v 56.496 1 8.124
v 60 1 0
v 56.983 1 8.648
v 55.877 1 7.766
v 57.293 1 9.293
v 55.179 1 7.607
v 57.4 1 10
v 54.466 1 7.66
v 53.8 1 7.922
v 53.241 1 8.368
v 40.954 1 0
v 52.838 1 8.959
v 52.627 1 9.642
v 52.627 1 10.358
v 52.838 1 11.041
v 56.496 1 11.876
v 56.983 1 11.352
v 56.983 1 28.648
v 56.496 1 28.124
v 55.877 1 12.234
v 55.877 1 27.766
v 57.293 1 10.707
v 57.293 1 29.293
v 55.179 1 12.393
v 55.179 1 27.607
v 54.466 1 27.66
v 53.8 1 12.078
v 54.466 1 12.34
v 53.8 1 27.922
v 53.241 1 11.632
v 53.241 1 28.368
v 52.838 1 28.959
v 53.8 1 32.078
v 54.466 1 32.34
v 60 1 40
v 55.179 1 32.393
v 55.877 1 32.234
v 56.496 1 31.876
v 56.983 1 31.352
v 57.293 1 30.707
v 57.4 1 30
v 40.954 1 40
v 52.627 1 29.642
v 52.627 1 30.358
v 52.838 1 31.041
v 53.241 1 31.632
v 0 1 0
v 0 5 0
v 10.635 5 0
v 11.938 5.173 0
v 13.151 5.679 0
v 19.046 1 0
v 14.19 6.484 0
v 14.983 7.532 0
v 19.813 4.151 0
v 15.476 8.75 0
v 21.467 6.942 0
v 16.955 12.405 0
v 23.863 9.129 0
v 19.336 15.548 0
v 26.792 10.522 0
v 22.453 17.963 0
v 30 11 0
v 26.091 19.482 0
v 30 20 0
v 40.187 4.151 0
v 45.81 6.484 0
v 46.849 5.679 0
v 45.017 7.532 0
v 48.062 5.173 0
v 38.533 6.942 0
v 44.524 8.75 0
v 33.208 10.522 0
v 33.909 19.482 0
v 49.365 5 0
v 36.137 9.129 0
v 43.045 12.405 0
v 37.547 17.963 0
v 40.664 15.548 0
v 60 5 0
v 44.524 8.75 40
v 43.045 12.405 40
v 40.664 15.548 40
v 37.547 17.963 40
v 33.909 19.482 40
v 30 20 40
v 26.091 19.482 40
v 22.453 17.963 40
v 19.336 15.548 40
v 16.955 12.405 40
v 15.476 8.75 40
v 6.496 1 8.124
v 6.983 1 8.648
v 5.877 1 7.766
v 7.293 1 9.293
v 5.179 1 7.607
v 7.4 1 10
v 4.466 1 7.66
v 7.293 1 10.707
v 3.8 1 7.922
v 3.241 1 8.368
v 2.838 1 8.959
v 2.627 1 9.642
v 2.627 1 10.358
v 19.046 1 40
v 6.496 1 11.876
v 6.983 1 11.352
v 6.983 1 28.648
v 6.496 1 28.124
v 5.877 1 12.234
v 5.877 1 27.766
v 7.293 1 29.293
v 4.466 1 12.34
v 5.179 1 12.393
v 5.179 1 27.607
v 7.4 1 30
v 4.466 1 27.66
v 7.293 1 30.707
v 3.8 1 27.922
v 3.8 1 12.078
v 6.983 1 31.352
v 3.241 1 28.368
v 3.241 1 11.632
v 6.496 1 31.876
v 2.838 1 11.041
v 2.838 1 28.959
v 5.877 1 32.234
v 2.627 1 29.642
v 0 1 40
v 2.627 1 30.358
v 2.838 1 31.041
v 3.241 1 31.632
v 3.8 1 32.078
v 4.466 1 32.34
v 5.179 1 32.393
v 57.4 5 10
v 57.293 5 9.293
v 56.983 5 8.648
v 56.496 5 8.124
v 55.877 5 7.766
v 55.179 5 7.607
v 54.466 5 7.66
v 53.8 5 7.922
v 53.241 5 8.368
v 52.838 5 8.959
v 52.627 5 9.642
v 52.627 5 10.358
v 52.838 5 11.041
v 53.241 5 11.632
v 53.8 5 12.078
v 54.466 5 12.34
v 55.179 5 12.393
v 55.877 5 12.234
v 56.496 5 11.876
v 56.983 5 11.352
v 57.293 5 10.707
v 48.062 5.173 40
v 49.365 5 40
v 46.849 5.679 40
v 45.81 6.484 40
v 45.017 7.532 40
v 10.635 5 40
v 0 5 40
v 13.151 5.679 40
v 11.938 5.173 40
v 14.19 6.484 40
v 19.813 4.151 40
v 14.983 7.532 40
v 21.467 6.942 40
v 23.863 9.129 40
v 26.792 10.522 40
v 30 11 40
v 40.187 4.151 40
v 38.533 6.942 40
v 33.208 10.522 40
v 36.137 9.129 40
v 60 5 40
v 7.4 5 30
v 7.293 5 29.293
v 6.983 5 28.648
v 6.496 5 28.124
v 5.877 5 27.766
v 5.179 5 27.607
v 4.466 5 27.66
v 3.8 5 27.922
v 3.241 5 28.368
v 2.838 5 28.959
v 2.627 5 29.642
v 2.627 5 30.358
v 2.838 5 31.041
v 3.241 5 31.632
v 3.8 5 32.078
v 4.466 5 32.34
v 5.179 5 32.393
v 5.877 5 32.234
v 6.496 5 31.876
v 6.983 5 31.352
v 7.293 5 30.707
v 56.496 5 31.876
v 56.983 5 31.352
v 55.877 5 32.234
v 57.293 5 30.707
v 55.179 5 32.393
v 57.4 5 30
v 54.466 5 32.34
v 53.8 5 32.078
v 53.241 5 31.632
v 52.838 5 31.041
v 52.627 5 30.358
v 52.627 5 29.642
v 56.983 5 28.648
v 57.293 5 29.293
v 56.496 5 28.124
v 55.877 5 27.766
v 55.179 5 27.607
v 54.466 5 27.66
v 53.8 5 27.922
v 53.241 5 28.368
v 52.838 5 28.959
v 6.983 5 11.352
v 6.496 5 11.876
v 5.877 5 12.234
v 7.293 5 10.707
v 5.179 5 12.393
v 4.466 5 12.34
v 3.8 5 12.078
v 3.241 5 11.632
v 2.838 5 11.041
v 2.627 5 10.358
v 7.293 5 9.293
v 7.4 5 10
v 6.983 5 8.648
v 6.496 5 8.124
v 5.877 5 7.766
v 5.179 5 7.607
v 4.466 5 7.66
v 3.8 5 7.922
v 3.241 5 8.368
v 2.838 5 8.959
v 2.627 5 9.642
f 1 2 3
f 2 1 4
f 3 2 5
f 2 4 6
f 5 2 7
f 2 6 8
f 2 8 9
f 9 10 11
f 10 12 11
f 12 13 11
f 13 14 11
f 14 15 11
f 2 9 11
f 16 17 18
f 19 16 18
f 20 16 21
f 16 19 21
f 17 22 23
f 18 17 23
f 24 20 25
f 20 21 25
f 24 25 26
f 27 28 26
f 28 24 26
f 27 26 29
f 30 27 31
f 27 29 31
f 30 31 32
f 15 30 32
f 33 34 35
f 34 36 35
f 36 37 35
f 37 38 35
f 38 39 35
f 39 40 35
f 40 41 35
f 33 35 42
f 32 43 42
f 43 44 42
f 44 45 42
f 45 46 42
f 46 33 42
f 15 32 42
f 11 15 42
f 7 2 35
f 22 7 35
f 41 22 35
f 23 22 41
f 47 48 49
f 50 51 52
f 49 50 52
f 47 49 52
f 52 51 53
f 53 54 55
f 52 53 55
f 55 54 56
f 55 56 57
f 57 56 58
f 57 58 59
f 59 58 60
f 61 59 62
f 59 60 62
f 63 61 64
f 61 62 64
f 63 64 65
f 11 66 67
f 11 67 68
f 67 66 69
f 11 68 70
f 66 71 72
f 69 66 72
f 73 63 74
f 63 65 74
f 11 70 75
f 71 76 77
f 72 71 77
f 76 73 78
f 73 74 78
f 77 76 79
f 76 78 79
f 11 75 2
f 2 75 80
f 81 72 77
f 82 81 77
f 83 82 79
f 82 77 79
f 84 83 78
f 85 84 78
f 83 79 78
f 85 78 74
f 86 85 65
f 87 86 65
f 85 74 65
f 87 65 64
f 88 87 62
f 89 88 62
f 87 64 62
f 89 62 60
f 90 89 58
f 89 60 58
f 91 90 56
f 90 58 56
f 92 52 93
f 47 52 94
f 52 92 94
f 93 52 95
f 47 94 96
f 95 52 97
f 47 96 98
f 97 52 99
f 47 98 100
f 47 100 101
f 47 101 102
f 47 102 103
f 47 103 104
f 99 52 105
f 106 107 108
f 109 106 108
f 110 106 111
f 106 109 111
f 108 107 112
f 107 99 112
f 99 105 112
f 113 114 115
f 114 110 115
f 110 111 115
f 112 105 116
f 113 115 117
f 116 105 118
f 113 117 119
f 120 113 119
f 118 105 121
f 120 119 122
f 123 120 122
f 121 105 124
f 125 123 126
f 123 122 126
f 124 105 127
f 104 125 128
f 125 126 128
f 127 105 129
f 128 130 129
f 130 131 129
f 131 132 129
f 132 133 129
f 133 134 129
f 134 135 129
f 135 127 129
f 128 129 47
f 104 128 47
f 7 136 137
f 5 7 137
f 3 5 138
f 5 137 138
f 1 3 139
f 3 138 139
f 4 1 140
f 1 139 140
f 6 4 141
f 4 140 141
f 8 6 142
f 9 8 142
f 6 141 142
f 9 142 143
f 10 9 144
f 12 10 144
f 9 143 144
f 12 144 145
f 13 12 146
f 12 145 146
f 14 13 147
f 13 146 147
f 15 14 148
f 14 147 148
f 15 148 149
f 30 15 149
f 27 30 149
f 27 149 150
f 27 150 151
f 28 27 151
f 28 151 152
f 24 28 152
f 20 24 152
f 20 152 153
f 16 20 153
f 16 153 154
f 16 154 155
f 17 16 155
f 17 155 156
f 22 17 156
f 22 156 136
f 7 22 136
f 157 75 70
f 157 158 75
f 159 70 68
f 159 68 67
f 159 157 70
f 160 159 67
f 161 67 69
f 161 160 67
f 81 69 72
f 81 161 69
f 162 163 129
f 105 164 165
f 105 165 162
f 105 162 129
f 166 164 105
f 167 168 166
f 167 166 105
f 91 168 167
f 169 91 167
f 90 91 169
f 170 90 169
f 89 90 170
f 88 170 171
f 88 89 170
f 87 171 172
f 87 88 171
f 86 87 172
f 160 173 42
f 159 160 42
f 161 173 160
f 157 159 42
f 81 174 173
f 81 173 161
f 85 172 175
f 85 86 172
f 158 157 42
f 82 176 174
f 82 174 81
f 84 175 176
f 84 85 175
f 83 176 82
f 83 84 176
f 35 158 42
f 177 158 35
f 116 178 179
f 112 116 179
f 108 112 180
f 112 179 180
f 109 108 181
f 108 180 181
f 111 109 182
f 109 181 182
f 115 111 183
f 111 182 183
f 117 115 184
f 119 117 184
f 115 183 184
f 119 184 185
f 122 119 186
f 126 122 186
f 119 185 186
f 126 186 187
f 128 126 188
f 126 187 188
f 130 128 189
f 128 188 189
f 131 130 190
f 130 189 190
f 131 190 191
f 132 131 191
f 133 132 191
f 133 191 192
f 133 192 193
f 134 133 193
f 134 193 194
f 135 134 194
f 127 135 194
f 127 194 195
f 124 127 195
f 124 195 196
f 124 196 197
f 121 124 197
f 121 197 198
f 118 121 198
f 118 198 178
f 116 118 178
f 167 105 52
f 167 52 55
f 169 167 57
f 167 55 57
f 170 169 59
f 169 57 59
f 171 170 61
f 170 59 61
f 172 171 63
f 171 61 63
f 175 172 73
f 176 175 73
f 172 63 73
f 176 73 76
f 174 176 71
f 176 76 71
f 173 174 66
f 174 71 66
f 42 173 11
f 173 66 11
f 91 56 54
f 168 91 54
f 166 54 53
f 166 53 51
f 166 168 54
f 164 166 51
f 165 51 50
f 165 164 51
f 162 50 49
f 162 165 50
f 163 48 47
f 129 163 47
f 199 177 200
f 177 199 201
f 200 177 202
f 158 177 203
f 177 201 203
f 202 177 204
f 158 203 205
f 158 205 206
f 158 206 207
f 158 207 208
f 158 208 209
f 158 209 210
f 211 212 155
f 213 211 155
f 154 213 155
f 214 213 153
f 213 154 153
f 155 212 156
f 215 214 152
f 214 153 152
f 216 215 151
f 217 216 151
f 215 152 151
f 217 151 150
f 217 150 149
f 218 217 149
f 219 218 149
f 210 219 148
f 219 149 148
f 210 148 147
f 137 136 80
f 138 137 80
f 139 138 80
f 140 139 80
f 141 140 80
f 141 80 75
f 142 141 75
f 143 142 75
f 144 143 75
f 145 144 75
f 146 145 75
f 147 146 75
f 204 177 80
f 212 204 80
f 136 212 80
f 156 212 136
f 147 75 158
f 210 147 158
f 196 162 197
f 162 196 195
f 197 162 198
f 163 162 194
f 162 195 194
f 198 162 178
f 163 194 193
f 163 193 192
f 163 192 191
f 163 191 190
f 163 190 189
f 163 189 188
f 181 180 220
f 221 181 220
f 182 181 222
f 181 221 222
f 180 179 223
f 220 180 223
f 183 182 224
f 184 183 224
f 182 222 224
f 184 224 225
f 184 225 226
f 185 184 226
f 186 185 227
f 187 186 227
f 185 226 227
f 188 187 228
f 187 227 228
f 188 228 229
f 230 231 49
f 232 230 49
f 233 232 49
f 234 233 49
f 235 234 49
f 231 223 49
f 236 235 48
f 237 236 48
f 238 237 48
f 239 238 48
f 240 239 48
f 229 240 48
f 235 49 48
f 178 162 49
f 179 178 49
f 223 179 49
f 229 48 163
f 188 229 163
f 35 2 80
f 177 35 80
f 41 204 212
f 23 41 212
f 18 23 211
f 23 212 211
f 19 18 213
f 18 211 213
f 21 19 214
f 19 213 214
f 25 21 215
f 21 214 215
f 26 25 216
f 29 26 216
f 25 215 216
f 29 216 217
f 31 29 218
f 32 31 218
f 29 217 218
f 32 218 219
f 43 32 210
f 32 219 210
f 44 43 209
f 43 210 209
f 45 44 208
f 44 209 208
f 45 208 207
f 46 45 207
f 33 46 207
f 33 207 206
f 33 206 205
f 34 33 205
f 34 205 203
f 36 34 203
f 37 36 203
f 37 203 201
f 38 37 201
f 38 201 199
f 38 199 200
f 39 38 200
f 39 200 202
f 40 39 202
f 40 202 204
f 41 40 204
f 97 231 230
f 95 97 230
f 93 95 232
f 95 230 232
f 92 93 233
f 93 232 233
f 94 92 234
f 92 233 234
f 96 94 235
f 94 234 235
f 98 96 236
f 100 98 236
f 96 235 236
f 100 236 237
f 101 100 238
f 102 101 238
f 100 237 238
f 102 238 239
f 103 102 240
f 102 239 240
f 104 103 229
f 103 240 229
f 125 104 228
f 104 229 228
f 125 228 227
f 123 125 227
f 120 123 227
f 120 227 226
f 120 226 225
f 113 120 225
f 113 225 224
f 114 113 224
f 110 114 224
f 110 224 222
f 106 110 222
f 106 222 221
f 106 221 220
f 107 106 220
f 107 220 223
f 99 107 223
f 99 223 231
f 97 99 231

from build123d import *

# Parameters (mm, degrees)
MORS_AMOVIBLE_DEPTH     = 40
ESQUISSE2_R             = 2.4
TROU_FIXATION_DEPTH     = 6
CONG_1_R                = 5
ENL_V_START             = -40
ESQUISSE3_W             = 60
ESQUISSE3_H             = 1
ENL_V_MAT_EXTRU_1_DEPTH = 40


with BuildPart() as part:
    # Esquisse1 → mors_amovible (new body)
    with BuildSketch(Plane.XY):
        with BuildLine():
            Line((60, 0), (60, 5))
            Line((60, 5), (45, 5))
            ThreePointArc((45, 5), (30, 20), (15, 5))
            Line((15, 5), (0, 5))
            Line((0, 5), (0, 0))
            Line((0, 0), (19, 0))
            ThreePointArc((19, 0), (30, 11), (41, 0))
            Line((41, 0), (60, 0))
        make_face()
    extrude(amount=MORS_AMOVIBLE_DEPTH)

    # Esquisse2 → trou_fixation (cut, through all)
    with BuildSketch(Plane(origin=(0, 5, 0), x_dir=(1, 0, 0), z_dir=(0, 1, 0))):
        with Locations((5, -10)):
            Circle(ESQUISSE2_R)
        with Locations((55, -10)):
            Circle(ESQUISSE2_R)
        with Locations((55, -30)):
            Circle(ESQUISSE2_R)
        with Locations((5, -30)):
            Circle(ESQUISSE2_R)
    extrude(amount=-TROU_FIXATION_DEPTH, mode=Mode.SUBTRACT)

    # Congé1
    cong_1_edges = [part.edges().sort_by_distance(p)[0] for p in [
        (15, 5, 20),
        (45, 5, 20),
    ]]
    fillet(cong_1_edges, radius=CONG_1_R)

    # Esquisse3 → Enlèv. mat.-Extru.1 (cut)
    with BuildSketch(Plane(origin=(0, 0, 0), x_dir=(-1, 0, 0), z_dir=(0, 0, -1)).offset(ENL_V_START)):
        with Locations((-30, 0.5)):
            Rectangle(ESQUISSE3_W, ESQUISSE3_H)
    extrude(amount=ENL_V_MAT_EXTRU_1_DEPTH, mode=Mode.SUBTRACT)


solid = part.part
